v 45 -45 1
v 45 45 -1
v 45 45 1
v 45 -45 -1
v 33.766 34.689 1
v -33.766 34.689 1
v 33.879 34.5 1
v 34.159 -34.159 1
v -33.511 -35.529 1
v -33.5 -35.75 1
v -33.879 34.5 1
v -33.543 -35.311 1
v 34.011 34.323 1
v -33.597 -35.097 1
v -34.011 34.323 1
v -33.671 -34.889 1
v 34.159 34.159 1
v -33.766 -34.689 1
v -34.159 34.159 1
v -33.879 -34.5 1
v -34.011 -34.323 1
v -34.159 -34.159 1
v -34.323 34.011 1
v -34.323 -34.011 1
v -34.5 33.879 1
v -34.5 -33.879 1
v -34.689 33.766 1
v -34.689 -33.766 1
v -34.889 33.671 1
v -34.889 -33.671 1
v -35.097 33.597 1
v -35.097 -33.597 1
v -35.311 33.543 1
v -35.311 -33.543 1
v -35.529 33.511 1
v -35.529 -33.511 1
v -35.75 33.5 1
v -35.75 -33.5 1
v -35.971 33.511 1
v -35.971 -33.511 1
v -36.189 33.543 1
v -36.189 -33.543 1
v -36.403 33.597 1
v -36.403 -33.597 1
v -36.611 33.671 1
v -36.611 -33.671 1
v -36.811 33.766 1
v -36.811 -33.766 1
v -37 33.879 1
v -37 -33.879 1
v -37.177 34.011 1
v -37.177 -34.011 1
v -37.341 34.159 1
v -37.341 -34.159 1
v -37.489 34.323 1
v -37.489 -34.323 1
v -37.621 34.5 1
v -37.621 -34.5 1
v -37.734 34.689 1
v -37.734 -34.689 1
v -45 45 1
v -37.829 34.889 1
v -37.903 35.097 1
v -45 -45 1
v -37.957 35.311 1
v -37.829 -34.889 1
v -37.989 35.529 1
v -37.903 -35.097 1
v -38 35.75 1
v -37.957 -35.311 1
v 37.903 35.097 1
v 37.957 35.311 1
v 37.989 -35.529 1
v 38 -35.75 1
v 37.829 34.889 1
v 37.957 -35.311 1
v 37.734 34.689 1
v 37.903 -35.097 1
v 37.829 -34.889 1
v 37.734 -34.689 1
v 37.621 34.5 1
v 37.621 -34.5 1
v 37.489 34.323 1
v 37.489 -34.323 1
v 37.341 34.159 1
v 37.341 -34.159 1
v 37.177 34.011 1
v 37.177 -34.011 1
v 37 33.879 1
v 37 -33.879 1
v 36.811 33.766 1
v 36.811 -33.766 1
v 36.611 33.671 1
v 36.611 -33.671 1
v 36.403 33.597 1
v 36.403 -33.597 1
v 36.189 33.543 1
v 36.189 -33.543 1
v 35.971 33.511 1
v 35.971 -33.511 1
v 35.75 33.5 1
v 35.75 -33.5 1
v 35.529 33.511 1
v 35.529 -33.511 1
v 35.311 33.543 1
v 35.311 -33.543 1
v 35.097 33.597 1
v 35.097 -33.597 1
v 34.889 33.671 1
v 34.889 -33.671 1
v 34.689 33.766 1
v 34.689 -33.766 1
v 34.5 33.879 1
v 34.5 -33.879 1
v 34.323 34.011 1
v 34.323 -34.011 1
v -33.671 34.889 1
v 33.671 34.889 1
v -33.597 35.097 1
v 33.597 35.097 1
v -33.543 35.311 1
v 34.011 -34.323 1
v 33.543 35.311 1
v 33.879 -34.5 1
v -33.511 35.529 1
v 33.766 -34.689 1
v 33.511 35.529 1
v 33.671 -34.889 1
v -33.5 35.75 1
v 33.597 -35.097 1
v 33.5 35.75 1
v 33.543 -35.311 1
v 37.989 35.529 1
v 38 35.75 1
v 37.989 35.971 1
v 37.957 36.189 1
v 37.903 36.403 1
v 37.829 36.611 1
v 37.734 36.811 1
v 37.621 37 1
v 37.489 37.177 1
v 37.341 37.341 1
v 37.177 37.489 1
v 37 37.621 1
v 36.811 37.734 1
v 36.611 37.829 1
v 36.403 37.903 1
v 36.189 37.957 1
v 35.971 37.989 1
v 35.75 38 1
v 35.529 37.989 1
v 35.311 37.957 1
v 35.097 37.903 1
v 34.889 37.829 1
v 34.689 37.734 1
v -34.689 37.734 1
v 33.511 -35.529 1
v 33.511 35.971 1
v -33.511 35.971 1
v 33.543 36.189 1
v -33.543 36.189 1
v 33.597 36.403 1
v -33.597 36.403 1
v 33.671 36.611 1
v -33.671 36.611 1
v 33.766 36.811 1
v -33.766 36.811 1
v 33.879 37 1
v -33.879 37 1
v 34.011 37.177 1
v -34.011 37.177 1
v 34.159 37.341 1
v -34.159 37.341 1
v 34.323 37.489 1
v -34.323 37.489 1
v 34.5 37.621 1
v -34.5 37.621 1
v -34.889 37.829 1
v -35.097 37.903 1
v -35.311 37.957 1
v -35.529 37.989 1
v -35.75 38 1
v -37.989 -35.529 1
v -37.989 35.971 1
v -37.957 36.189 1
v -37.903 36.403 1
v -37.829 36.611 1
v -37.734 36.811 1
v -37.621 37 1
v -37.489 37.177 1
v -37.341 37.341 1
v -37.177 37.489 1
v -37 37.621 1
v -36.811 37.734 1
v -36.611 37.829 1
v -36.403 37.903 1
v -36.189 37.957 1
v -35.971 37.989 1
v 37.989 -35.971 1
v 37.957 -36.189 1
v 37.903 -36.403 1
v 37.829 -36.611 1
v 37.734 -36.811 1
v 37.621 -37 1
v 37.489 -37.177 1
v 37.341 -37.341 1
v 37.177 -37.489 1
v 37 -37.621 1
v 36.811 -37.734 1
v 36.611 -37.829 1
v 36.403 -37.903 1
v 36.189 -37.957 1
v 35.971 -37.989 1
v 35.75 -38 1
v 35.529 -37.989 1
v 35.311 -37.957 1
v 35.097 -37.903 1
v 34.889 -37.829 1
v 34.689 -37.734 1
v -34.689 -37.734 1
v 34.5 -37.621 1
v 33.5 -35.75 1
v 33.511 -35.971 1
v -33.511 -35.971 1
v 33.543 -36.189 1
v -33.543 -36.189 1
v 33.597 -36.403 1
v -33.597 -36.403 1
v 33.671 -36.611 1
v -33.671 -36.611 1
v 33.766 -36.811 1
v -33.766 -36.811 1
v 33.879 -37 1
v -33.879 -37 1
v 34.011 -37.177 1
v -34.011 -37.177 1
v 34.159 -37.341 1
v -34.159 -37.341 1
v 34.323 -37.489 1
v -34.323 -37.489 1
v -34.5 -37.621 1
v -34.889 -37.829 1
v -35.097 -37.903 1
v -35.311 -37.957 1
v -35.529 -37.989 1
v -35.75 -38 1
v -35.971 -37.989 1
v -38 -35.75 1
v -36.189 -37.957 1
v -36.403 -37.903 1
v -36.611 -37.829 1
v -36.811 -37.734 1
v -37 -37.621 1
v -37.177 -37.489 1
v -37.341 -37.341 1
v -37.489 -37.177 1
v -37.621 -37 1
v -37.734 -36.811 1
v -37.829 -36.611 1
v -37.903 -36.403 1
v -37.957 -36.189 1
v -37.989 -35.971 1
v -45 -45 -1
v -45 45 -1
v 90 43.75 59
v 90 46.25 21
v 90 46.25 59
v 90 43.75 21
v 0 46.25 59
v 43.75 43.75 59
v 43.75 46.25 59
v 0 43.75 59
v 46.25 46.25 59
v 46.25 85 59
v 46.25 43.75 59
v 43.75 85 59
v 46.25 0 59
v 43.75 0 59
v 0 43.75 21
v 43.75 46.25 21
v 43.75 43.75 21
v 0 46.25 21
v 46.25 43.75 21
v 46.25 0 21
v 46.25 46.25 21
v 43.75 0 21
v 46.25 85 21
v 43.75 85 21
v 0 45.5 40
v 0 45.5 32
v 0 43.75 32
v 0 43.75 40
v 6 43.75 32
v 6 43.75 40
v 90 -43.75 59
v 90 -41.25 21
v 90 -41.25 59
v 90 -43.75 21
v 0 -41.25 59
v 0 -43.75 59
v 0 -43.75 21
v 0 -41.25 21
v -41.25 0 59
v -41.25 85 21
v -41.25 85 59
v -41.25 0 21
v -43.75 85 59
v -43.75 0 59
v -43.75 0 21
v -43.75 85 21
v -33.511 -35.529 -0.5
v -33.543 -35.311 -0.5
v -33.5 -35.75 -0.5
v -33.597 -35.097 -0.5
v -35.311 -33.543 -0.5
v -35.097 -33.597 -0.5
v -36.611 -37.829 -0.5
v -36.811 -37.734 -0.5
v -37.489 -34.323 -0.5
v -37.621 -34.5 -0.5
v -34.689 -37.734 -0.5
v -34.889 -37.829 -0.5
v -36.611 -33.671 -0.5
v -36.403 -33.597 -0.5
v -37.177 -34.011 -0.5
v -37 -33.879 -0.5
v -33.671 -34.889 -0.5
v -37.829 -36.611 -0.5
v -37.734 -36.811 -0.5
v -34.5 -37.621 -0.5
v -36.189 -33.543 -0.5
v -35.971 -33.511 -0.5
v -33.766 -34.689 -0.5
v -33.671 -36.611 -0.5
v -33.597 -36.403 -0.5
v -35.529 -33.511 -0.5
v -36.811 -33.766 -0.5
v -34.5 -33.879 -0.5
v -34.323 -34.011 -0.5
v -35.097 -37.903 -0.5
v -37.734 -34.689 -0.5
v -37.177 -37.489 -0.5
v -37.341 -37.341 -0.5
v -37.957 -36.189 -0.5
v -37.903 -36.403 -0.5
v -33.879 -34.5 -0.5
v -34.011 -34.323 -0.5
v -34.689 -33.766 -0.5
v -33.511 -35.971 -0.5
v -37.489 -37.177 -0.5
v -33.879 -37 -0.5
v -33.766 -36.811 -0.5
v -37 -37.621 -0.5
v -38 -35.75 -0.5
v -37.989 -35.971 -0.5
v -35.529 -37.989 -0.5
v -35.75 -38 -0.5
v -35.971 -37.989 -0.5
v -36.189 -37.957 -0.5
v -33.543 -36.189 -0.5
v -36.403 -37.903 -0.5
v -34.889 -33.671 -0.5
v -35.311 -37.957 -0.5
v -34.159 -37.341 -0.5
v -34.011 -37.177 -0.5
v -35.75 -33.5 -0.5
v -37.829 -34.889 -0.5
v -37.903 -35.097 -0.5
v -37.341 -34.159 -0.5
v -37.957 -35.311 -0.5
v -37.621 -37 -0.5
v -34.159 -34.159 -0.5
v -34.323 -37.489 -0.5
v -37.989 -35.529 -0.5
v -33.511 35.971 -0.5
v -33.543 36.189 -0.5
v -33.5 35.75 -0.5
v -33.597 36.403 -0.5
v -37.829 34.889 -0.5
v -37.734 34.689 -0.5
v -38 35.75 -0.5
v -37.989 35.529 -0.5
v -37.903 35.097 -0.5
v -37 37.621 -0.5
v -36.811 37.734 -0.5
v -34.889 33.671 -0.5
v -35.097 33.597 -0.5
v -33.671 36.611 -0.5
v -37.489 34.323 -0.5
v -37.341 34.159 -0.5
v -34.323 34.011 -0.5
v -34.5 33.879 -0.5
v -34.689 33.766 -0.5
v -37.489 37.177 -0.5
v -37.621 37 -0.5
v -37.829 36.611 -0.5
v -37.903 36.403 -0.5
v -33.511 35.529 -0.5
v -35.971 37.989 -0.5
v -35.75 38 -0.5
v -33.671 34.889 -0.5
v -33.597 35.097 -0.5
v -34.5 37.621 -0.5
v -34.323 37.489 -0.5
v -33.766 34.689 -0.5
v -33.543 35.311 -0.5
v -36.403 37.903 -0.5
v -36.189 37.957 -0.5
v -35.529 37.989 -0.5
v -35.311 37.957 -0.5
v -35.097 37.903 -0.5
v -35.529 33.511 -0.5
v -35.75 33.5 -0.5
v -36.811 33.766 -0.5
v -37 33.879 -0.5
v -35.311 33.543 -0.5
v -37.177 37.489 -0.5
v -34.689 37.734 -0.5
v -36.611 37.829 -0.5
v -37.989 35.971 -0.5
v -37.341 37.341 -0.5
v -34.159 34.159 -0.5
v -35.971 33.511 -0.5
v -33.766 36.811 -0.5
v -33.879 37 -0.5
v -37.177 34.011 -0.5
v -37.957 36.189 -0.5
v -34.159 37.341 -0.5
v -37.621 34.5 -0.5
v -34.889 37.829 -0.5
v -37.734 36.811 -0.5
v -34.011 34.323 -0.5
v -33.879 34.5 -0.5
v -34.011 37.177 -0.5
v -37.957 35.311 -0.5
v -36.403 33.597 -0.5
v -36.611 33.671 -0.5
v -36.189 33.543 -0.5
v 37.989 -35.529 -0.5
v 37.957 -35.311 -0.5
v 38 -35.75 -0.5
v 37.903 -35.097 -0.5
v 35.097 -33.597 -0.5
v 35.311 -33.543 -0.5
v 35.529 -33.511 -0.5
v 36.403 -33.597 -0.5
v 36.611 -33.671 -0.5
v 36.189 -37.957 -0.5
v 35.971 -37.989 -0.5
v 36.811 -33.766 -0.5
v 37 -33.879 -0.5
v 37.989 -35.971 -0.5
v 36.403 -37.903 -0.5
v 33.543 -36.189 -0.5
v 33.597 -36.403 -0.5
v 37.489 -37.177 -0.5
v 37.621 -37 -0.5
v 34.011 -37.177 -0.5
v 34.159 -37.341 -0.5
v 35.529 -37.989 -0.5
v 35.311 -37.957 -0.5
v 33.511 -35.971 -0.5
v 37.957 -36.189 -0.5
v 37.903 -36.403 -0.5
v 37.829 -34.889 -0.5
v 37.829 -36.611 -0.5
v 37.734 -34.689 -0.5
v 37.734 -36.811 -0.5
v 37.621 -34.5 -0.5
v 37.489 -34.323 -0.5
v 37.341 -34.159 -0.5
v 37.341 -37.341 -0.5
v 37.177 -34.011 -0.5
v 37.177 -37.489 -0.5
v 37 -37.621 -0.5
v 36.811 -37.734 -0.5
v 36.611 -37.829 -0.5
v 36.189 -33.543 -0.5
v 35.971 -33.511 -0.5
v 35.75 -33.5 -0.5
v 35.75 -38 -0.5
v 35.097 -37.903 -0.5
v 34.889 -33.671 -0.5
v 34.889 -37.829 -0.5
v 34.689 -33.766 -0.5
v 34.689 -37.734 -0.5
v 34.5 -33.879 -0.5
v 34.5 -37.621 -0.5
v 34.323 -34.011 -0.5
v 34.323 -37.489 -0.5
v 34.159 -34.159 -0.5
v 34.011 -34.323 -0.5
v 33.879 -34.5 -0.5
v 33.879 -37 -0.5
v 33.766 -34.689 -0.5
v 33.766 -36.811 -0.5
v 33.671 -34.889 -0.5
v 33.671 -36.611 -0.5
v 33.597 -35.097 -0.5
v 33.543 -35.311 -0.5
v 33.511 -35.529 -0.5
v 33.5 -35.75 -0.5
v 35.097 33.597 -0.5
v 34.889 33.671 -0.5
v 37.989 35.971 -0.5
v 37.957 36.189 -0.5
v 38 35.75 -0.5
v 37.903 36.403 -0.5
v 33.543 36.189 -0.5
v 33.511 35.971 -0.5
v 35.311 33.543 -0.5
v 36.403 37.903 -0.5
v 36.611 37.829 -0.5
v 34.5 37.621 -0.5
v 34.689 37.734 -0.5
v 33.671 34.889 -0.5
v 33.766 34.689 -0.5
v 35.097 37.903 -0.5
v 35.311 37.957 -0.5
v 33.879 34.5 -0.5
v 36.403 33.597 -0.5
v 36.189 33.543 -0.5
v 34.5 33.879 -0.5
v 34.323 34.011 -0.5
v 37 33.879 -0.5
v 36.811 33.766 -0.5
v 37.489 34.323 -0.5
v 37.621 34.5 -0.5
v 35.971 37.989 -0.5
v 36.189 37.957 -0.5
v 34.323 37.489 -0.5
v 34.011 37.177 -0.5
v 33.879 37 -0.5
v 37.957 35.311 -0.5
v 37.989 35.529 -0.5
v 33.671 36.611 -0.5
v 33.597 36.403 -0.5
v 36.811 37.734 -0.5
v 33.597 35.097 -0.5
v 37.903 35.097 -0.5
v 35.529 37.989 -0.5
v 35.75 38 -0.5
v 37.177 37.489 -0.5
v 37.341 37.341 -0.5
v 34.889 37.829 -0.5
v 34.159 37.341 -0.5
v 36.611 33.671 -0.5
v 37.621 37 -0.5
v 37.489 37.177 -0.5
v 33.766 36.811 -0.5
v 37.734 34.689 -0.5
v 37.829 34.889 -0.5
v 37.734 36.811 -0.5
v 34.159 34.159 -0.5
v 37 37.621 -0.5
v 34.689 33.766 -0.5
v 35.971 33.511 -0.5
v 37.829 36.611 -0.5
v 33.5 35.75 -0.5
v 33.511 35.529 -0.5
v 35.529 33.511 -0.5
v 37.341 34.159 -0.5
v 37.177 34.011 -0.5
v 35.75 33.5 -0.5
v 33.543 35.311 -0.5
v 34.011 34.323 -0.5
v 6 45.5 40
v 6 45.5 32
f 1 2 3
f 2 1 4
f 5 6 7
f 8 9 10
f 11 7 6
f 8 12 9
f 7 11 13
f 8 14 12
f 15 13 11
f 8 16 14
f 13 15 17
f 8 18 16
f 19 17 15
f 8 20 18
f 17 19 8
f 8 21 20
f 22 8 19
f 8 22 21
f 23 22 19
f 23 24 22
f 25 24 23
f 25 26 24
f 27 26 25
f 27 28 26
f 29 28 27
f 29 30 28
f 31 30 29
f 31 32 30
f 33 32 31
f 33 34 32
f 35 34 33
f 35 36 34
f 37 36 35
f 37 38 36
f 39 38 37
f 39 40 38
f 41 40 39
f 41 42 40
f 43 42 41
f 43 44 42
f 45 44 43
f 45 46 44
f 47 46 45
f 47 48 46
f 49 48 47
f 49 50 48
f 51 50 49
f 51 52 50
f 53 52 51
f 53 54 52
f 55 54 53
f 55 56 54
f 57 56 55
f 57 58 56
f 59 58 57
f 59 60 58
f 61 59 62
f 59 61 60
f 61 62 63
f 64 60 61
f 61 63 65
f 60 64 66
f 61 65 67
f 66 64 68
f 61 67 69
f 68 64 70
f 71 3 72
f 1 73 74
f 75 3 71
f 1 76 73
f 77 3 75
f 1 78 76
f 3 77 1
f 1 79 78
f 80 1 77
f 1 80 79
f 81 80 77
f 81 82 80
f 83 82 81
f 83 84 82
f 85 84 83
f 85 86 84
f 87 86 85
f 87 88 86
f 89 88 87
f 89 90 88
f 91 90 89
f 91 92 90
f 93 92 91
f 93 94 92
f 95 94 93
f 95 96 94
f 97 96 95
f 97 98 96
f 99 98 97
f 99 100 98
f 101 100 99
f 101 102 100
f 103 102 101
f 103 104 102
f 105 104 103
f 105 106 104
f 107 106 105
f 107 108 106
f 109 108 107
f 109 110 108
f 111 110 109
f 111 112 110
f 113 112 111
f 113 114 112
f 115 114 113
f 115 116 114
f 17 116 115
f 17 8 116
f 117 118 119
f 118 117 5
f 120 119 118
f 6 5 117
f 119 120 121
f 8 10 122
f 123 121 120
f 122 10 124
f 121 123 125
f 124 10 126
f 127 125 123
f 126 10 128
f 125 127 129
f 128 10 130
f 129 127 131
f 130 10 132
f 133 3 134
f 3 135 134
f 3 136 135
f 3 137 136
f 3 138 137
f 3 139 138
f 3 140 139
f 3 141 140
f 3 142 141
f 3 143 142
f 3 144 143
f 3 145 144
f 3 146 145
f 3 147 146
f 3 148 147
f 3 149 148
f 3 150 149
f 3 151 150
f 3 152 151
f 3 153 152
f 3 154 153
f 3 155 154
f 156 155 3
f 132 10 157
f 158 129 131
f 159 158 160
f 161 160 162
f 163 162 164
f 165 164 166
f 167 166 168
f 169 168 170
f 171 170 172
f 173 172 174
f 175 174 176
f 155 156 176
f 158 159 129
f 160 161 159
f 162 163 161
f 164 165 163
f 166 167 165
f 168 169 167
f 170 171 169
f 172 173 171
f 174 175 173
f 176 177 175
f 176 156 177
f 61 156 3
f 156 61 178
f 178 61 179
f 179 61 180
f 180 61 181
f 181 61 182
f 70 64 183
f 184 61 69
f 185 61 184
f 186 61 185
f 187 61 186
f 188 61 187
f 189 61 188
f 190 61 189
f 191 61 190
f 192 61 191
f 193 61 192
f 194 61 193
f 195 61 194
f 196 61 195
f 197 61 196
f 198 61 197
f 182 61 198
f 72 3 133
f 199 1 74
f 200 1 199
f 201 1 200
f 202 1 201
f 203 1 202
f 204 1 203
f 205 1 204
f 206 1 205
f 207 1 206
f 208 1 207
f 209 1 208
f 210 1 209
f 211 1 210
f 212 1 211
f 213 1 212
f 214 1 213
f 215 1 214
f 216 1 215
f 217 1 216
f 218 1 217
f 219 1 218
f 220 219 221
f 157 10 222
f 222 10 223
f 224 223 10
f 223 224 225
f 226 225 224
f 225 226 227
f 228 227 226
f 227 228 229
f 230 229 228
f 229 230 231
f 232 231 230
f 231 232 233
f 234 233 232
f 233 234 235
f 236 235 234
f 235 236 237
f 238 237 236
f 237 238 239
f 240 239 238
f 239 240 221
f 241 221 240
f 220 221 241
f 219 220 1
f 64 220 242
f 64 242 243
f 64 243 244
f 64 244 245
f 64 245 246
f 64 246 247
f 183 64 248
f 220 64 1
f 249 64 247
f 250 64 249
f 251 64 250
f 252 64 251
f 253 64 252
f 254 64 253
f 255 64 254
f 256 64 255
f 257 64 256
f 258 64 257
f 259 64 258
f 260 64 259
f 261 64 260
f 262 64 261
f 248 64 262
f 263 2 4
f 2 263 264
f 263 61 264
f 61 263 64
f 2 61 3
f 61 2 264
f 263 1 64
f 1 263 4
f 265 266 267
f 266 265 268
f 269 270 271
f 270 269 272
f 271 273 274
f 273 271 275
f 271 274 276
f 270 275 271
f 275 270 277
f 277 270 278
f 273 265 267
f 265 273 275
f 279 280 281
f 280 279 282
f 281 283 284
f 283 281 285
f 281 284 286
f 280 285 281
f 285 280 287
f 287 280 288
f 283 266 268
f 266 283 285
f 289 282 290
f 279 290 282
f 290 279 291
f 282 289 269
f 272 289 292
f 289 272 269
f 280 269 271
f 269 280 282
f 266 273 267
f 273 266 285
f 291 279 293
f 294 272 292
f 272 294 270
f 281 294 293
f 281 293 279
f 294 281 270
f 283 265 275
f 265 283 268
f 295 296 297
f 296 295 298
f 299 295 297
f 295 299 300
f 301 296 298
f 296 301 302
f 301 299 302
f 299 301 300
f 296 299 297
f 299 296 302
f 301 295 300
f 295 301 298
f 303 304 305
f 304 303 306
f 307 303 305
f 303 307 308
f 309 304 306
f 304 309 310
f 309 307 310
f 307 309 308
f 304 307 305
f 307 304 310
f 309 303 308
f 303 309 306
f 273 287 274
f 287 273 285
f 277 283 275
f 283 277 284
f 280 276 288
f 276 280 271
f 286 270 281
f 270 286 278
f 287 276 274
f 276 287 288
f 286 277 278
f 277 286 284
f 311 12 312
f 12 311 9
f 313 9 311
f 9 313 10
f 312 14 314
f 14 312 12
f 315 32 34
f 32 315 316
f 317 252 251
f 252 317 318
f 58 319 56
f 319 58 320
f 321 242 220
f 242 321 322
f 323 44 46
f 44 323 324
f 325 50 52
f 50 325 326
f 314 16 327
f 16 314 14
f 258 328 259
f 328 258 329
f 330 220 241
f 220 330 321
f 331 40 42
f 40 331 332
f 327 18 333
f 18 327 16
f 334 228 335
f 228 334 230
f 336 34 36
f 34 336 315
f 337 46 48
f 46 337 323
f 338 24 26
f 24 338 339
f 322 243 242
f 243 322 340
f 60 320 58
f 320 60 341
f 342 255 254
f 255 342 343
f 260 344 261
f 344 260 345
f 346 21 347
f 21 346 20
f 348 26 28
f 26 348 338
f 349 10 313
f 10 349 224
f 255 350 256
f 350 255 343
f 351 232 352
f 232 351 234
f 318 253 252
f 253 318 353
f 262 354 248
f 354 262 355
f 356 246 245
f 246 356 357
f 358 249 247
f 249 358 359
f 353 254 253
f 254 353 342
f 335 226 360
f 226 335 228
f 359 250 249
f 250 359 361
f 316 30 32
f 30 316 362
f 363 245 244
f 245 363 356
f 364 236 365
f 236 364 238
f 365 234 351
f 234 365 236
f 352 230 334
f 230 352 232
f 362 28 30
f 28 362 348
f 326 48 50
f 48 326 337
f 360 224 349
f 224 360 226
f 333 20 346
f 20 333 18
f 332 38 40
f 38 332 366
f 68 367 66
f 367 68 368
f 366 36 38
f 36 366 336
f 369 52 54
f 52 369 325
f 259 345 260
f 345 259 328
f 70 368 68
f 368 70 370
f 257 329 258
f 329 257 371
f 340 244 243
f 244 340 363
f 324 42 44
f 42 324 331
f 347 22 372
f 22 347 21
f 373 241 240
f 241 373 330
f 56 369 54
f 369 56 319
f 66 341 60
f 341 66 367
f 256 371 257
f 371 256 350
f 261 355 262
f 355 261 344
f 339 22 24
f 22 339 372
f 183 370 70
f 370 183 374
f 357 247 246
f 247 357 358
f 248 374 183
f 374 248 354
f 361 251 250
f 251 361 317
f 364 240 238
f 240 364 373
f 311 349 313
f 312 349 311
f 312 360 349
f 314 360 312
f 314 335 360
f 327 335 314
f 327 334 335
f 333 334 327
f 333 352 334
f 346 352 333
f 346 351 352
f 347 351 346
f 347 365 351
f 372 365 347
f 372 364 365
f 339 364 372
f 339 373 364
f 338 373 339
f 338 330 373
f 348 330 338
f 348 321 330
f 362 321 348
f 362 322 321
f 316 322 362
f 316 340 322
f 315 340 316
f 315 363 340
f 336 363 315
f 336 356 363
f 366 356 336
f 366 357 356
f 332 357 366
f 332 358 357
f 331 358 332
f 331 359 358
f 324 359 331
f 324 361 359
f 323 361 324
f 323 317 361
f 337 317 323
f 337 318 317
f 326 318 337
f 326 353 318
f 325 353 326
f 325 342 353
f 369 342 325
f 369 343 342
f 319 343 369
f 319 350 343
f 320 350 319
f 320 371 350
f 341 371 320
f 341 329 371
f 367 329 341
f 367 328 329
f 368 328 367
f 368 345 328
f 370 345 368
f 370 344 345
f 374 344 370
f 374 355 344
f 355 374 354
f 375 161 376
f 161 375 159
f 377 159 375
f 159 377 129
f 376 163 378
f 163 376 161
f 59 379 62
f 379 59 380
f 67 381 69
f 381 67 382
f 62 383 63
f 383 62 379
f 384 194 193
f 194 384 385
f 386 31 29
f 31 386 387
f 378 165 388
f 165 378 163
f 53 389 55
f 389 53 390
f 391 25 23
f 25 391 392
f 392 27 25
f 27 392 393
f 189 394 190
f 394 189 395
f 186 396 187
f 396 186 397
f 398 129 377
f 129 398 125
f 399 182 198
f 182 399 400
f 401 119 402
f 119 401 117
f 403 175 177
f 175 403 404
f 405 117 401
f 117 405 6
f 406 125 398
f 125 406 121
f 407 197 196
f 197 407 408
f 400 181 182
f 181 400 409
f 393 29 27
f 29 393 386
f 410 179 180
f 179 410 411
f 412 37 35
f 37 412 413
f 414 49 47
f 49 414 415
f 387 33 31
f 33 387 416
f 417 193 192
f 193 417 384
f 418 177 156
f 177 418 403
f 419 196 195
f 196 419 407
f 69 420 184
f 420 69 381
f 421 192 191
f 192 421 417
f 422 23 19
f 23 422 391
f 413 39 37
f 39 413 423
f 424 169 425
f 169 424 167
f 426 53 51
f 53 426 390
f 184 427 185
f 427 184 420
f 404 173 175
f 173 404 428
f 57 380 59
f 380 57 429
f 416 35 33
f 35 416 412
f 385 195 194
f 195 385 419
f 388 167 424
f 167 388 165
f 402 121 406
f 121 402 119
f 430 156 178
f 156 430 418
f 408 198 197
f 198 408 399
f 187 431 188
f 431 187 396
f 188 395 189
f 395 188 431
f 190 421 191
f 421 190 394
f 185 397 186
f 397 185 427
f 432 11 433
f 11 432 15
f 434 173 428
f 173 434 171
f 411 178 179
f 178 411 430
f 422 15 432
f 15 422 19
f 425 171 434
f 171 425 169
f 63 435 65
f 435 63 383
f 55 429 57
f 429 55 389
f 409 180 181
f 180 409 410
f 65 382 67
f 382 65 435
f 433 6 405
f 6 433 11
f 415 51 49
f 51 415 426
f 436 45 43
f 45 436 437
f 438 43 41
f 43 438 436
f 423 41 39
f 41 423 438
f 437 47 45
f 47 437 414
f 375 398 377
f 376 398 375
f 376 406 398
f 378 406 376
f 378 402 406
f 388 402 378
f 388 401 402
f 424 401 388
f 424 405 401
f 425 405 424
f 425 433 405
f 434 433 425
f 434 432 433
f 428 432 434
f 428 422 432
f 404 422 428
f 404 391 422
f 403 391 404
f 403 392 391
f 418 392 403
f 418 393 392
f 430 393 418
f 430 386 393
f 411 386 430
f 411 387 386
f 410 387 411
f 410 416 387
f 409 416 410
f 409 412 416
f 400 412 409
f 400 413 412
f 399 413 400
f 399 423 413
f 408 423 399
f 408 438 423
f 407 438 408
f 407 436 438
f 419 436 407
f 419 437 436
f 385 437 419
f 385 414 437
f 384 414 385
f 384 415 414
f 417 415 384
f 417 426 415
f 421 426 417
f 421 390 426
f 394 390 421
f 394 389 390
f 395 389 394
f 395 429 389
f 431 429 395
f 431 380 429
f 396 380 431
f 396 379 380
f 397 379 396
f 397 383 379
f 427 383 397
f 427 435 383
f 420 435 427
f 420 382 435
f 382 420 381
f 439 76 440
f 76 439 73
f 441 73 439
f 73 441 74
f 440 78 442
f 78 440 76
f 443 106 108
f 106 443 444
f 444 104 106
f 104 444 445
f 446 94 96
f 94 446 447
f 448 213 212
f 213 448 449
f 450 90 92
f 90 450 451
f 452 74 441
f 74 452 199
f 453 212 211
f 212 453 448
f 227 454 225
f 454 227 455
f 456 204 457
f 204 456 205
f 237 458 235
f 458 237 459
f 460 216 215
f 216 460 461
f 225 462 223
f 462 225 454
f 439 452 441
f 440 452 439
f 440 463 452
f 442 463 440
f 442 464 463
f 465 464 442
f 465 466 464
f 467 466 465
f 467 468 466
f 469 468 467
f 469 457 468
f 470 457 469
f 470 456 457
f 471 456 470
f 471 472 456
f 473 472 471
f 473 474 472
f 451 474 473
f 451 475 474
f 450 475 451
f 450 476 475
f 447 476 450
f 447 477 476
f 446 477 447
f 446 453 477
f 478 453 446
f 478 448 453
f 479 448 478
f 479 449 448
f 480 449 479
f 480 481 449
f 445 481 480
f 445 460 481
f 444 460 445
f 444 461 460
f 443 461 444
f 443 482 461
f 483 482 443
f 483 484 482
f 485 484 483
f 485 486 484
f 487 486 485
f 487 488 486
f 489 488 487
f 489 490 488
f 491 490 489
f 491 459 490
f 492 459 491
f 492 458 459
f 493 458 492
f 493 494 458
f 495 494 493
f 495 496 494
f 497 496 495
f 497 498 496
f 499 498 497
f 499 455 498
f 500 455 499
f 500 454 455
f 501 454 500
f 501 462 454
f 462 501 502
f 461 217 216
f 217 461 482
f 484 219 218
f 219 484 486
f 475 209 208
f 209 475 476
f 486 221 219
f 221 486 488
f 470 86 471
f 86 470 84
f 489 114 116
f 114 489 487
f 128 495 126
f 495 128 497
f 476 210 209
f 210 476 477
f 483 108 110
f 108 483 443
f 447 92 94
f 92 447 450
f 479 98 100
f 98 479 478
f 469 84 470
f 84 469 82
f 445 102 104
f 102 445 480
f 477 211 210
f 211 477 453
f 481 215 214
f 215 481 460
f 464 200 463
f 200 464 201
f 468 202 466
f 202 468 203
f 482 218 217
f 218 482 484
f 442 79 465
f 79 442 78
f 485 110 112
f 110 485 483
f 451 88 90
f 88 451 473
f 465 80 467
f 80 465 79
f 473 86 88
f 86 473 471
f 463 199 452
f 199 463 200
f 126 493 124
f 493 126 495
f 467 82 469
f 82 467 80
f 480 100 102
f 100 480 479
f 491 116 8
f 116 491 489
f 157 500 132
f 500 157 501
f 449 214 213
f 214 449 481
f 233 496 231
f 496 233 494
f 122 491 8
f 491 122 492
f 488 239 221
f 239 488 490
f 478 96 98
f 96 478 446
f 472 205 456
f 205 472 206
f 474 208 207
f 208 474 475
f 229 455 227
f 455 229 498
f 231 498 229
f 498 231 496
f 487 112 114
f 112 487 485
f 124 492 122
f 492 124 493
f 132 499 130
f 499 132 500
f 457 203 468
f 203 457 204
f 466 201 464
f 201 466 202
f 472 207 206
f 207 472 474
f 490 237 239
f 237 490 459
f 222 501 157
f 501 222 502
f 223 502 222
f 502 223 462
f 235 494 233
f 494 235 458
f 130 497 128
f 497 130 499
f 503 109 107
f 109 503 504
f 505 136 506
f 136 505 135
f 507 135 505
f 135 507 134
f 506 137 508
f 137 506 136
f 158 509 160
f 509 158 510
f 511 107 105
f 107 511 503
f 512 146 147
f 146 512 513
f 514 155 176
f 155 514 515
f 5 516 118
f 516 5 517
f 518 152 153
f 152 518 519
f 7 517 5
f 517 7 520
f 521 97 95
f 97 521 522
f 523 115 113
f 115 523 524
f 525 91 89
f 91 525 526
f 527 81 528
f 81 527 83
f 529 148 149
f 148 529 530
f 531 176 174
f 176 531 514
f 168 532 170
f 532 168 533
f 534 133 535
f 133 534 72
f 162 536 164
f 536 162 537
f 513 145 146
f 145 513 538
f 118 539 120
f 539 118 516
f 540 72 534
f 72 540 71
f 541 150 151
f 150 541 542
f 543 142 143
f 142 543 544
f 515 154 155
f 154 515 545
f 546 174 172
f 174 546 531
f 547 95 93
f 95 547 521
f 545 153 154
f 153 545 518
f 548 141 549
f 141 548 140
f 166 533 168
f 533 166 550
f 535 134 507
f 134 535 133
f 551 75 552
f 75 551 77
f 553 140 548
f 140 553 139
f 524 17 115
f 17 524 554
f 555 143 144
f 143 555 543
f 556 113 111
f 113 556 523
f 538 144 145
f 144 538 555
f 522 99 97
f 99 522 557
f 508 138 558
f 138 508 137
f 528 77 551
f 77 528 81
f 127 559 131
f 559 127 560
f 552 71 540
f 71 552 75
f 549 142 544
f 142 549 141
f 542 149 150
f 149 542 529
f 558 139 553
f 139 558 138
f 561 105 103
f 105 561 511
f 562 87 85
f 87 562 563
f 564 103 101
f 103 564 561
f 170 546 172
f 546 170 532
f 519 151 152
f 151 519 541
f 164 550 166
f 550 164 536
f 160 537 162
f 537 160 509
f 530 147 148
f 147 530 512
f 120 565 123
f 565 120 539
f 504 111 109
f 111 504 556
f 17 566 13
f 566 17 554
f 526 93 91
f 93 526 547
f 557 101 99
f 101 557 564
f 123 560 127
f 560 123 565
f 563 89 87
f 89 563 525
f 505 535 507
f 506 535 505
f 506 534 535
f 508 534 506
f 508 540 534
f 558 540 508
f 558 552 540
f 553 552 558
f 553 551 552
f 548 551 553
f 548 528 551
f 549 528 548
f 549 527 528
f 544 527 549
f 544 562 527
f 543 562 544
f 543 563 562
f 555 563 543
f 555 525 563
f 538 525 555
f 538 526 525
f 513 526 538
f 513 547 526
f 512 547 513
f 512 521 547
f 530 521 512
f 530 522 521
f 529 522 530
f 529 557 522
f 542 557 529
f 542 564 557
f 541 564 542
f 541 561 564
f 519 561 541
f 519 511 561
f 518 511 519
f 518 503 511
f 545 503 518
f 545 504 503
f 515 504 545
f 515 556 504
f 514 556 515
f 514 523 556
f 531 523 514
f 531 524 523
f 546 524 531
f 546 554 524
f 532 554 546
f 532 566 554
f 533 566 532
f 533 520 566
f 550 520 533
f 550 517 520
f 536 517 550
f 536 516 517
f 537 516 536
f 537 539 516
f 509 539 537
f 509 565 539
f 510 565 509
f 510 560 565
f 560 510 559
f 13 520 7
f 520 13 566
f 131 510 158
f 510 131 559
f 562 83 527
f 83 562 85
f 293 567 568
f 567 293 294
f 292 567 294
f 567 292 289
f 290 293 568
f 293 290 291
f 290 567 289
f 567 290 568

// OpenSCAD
// Dimensions (mm)
top_plate_thickness = 2;
wall_thickness = 2.5;
wall_height = 40;
outer_size = 90;
screw_hole_dia = 4.5;
screw_pattern_size = 71.5;
cable_notch_width = 12;
cable_notch_depth = 8;

// Derived dimensions
inner_size = outer_size - 2 * wall_thickness;
half_outer = outer_size / 2;
half_inner = inner_size / 2;
half_pattern = screw_pattern_size / 2;

$fn = 64;

difference() {
    // Main housing body
    union() {
        // Top plate (rests on bed, z=0 to 2)
        cube([outer_size, outer_size, top_plate_thickness], center = true);
        
        // Four walls rising from top plate to z=40
        // Front wall (positive Y)
        translate([0, half_outer - wall_thickness/2, top_plate_thickness + (wall_height - top_plate_thickness)/2])
            cube([outer_size, wall_thickness, wall_height - top_plate_thickness]);
        
        // Back wall (negative Y)
        translate([0, -half_outer + wall_thickness/2, top_plate_thickness + (wall_height - top_plate_thickness)/2])
            cube([outer_size, wall_thickness, wall_height - top_plate_thickness]);
        
        // Left wall (negative X)
        translate([-half_outer + wall_thickness/2, 0, top_plate_thickness + (wall_height - top_plate_thickness)/2])
            cube([wall_thickness, outer_size - 2*wall_thickness, wall_height - top_plate_thickness]);
        
        // Right wall (positive X)
        translate([half_outer - wall_thickness/2, 0, top_plate_thickness + (wall_height - top_plate_thickness)/2])
            cube([wall_thickness, outer_size - 2*wall_thickness, wall_height - top_plate_thickness]);
    }
    
    // Four M4 screw holes through top plate on 71.5 mm square pattern
    for (x = [-half_pattern, half_pattern]) {
        for (y = [-half_pattern, half_pattern]) {
            translate([x, y, -0.5])
                cylinder(r = screw_hole_dia/2, h = top_plate_thickness + 1, center = false);
        }
    }
    
    // Cable notch in one wall (front wall, positive Y)
    // Notch is 12 mm wide, centered along the wall, reaching 8 mm down from open edge (z=32 to z=40)
    translate([0, half_outer - wall_thickness/2, wall_height - cable_notch_depth/2])
        cube([cable_notch_width, wall_thickness + 1, cable_notch_depth], center = true);
}
